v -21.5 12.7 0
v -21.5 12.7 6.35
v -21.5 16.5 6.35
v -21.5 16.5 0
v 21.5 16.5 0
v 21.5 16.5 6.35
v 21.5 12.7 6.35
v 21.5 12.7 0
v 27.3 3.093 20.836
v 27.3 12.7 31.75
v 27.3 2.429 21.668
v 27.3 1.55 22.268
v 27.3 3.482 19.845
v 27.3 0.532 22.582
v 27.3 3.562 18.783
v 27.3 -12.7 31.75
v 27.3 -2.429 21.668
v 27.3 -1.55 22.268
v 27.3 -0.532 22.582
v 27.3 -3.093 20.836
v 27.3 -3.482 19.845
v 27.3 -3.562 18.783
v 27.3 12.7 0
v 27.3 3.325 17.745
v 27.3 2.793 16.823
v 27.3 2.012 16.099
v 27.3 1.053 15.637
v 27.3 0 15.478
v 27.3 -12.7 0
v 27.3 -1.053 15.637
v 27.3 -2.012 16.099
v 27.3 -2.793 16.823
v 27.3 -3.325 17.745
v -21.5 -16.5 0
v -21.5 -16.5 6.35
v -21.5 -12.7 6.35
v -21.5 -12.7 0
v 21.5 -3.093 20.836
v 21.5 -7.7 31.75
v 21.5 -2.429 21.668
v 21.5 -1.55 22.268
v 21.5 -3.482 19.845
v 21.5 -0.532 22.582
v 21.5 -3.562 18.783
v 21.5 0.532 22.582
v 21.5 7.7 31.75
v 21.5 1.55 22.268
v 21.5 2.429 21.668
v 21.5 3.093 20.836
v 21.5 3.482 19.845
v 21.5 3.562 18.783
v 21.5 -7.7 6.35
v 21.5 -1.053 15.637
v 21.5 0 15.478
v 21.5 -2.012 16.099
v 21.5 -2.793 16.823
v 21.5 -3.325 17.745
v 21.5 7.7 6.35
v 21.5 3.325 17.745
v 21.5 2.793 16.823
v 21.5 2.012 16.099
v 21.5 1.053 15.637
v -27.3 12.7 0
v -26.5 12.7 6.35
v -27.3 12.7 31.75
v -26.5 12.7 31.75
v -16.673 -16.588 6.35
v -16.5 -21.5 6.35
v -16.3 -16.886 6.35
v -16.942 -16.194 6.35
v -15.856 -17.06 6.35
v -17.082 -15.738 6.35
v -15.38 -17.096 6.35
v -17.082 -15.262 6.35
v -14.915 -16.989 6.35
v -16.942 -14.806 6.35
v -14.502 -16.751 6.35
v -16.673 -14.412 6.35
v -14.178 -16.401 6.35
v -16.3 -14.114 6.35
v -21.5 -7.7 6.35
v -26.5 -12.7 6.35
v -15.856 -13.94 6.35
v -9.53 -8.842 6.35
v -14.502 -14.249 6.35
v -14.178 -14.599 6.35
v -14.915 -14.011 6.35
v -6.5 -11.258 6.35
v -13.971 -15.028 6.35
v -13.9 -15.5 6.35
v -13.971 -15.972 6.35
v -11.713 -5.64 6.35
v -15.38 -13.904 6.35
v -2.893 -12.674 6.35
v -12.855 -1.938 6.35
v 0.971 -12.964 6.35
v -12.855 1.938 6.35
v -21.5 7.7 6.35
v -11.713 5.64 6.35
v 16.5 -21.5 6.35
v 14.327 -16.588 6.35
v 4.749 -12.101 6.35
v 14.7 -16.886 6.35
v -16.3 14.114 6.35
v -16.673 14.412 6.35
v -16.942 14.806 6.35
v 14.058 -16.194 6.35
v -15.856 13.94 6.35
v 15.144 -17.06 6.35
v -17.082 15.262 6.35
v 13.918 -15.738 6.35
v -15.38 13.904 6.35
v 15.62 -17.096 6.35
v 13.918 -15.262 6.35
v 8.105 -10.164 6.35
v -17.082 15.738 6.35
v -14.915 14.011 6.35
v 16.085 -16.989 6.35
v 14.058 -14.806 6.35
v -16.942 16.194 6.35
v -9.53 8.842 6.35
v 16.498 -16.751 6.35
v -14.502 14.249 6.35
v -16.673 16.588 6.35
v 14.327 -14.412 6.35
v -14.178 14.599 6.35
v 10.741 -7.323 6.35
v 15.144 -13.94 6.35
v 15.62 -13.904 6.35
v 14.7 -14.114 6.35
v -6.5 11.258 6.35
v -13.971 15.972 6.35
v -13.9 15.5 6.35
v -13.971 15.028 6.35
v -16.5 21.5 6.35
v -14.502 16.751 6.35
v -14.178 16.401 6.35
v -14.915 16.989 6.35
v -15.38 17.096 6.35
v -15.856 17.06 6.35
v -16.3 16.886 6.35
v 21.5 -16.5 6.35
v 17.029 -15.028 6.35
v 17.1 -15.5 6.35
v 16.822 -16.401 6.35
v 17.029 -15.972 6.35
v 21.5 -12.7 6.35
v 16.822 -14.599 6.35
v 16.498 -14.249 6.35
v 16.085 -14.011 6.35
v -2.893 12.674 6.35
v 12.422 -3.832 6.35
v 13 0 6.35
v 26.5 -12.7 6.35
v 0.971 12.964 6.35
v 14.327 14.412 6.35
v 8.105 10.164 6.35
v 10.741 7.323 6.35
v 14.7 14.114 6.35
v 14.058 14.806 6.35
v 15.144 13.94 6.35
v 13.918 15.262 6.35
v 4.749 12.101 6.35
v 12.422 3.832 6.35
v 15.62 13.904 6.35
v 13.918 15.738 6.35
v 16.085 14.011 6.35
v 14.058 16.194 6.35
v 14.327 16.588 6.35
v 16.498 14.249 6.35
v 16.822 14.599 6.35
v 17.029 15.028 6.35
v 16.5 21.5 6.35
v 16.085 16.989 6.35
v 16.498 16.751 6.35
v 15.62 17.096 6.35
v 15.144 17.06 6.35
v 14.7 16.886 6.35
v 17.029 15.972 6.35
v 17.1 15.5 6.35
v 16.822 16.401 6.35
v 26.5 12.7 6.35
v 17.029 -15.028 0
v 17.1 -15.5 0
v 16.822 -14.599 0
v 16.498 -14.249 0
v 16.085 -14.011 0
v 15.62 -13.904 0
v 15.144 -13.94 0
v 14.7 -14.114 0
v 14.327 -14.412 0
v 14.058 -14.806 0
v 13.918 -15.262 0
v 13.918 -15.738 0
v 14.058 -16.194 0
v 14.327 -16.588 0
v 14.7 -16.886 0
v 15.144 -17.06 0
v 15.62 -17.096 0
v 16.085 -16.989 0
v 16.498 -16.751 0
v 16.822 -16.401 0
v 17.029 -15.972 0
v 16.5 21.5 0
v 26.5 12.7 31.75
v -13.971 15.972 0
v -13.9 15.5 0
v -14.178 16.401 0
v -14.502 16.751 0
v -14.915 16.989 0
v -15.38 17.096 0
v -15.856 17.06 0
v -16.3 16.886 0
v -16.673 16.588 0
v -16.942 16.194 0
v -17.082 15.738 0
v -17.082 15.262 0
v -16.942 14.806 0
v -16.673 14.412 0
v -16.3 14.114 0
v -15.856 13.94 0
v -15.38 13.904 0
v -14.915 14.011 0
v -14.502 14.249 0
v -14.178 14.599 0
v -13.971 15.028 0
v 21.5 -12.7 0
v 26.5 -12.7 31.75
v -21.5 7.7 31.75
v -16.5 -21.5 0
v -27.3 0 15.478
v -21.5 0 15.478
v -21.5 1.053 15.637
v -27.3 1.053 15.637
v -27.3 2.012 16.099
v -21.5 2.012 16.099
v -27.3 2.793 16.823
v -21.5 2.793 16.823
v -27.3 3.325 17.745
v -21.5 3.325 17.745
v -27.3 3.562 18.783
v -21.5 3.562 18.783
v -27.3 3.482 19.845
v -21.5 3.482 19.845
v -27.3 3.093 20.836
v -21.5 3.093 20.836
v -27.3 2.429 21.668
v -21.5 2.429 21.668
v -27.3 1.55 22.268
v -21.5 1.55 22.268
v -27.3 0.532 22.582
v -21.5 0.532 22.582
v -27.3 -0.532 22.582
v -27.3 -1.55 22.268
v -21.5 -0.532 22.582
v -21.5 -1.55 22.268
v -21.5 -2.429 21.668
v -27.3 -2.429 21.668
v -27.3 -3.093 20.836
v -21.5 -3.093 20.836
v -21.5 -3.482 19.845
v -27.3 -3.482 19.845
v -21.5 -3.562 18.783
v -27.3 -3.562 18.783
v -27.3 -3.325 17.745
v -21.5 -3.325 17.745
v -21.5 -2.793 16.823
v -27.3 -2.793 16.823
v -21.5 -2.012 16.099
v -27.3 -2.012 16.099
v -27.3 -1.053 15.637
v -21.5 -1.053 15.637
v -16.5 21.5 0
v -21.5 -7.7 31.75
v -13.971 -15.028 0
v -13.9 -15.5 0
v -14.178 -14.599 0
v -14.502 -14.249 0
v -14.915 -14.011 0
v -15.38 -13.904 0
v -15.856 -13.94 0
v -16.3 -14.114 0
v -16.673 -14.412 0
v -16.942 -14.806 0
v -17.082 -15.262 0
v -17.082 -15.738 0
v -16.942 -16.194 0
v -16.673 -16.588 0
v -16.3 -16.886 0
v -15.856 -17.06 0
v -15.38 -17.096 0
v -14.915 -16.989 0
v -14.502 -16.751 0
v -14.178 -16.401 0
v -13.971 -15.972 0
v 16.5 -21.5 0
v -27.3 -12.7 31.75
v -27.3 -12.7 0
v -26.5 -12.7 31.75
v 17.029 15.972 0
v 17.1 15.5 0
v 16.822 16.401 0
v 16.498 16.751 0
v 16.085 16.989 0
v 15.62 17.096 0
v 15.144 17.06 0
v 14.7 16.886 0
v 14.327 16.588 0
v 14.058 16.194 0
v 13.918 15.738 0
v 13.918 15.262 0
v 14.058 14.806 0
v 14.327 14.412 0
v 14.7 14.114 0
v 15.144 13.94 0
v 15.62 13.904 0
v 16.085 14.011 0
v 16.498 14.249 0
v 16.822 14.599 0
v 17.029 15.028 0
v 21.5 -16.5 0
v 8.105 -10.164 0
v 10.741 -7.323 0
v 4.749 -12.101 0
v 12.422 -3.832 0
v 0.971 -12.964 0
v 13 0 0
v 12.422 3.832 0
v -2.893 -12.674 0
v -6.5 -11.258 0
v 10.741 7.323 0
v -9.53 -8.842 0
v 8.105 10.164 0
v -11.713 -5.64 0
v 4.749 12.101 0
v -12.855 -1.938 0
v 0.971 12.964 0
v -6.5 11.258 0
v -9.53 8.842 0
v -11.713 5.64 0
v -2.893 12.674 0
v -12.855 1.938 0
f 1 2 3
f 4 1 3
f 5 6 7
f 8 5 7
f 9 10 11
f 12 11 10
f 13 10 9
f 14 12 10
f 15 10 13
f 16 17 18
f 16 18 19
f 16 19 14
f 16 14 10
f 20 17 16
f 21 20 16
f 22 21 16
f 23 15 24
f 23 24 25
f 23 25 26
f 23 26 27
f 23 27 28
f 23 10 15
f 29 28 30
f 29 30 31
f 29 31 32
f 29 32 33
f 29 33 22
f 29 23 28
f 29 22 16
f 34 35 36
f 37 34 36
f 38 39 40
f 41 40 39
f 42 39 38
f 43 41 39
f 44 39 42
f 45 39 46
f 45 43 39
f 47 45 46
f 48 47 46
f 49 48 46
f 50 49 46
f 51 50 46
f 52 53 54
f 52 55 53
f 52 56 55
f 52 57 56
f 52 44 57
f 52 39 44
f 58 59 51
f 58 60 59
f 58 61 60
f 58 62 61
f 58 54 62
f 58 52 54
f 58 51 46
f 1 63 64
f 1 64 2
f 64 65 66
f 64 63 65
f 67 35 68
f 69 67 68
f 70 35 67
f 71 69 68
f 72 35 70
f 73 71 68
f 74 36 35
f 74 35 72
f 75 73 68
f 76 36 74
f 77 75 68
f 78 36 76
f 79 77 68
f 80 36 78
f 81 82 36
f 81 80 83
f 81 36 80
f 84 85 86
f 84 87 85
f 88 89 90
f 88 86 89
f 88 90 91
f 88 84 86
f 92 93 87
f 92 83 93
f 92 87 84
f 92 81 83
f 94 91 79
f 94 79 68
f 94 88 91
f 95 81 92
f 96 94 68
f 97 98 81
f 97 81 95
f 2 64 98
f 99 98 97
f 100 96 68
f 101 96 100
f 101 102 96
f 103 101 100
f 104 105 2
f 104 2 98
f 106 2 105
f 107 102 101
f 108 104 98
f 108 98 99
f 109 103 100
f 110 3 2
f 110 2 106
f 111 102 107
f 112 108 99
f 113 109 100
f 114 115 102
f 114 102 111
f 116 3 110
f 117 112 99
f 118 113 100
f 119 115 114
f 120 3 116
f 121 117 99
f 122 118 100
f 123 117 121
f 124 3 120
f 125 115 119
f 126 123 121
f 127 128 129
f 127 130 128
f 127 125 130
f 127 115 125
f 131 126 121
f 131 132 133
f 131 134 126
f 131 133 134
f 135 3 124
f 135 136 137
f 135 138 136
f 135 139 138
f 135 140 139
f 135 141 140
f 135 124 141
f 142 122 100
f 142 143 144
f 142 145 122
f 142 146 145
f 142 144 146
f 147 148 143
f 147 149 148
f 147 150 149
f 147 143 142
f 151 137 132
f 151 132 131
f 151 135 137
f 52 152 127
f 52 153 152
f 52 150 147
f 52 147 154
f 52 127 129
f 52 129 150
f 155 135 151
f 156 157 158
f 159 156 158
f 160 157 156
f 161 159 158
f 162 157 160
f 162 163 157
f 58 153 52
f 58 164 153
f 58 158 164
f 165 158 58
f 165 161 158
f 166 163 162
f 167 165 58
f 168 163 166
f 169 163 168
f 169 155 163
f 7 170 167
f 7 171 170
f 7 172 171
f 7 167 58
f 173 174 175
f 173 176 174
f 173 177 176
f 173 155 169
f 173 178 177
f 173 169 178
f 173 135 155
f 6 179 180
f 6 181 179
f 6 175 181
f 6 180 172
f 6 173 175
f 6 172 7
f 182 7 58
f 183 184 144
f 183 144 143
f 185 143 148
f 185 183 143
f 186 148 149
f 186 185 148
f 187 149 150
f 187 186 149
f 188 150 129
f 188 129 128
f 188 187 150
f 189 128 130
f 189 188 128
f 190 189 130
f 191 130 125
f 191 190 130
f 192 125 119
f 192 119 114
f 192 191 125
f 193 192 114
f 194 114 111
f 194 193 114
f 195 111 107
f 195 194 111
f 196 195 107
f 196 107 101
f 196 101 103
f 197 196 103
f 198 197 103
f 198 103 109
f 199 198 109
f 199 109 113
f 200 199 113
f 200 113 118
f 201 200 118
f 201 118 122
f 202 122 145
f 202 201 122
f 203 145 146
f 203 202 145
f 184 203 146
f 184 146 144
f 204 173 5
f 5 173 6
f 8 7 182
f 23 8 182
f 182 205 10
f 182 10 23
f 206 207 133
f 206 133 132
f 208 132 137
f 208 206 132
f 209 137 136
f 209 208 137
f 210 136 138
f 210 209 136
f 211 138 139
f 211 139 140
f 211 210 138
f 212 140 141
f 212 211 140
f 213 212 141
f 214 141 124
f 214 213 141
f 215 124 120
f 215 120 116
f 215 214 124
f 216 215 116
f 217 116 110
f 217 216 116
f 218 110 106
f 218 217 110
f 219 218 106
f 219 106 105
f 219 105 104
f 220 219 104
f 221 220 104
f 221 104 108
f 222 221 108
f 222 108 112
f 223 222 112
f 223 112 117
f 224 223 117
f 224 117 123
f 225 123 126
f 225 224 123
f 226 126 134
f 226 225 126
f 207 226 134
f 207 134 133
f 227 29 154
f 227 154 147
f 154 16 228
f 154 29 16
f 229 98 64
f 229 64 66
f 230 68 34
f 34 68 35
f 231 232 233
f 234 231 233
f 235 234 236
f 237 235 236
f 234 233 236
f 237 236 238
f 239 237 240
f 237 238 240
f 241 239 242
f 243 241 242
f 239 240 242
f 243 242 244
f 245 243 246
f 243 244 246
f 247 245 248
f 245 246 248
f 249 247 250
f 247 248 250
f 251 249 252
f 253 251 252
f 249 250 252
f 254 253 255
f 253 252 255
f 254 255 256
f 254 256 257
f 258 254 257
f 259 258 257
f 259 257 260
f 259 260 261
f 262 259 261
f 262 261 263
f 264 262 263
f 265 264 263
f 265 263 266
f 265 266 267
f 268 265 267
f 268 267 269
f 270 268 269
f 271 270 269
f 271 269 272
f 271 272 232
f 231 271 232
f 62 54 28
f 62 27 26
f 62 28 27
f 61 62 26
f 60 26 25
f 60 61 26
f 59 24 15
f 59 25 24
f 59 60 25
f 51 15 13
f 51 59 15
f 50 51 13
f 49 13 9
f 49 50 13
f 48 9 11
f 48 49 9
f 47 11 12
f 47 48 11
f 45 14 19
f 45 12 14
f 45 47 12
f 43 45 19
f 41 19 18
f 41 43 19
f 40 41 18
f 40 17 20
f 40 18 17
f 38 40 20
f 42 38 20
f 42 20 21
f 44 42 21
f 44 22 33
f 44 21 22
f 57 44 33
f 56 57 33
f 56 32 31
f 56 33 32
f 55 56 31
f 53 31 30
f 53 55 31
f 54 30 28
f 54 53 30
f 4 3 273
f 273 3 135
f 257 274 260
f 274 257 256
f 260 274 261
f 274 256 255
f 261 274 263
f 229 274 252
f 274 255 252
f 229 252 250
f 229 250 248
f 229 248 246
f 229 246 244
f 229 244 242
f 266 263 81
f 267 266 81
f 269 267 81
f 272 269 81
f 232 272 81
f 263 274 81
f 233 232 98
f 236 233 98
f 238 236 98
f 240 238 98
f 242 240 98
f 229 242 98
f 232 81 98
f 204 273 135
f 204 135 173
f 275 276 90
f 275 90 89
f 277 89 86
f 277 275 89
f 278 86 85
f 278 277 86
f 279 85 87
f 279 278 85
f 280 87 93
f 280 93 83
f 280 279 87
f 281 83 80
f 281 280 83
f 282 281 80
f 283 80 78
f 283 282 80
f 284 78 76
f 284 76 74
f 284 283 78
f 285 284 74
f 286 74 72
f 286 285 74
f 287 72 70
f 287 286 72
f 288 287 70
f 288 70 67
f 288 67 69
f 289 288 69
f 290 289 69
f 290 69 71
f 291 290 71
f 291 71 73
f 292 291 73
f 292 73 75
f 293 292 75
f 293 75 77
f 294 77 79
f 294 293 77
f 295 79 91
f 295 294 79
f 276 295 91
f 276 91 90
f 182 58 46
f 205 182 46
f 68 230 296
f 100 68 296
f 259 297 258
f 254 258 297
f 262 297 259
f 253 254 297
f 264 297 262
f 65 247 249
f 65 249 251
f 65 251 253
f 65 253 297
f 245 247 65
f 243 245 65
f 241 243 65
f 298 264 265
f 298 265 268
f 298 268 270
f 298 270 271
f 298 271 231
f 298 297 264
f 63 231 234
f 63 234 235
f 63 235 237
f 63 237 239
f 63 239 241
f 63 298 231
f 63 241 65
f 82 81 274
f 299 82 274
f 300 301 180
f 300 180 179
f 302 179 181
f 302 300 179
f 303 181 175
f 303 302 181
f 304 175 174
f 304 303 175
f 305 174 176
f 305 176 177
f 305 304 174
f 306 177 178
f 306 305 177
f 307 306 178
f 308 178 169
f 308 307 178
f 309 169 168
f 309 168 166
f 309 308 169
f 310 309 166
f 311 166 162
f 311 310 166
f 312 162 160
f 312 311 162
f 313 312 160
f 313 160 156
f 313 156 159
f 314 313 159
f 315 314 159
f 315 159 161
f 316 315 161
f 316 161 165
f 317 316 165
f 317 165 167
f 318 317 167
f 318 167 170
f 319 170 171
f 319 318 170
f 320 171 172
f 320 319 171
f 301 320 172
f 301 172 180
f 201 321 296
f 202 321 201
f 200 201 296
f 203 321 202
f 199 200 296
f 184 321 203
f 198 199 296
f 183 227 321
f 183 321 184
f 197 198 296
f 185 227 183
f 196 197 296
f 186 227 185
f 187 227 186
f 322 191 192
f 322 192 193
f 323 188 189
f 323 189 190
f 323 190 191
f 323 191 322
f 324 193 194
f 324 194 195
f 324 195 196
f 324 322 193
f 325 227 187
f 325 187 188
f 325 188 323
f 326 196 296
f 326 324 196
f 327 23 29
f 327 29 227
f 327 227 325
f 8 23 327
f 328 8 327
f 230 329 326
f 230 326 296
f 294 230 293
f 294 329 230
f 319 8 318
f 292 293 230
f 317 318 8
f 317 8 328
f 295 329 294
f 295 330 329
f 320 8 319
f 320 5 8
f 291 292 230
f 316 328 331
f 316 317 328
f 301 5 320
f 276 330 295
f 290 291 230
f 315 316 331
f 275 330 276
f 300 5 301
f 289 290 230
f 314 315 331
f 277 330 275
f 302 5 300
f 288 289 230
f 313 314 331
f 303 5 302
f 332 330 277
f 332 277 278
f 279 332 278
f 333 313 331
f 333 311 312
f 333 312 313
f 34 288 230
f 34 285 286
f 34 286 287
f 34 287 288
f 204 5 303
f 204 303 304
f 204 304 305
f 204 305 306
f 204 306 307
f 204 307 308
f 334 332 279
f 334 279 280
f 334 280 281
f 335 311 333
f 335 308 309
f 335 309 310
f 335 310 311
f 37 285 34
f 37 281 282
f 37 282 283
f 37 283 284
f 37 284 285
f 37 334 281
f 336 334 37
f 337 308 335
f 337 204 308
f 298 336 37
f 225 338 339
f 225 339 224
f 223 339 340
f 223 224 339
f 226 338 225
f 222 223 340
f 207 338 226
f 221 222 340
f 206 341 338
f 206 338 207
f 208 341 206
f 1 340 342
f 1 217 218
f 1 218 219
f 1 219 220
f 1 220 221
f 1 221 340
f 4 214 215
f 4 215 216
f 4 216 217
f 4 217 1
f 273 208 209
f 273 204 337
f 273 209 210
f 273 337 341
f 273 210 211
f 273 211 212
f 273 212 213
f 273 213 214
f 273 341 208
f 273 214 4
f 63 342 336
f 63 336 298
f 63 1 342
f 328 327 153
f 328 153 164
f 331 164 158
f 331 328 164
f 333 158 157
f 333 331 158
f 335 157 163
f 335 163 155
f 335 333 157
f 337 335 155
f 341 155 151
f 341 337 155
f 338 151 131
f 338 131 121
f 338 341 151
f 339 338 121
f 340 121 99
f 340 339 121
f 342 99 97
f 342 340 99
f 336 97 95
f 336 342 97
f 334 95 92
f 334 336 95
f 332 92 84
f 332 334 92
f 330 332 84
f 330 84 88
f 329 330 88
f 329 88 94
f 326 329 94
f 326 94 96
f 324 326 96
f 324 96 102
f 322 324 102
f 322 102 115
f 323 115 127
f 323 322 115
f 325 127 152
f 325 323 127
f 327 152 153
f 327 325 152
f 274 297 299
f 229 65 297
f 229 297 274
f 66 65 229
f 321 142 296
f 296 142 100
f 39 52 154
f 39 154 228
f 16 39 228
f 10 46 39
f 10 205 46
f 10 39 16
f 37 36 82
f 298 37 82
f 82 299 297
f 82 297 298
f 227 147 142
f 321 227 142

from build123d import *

# Parameters (mm, degrees)
SKETCH1_R               = 13
SKETCH1_R_2             = 1.6
BOSS_EXTRUDE1_DEPTH     = 6.35
SKETCH2_W               = 5.8
SKETCH2_H               = 43
BOSS_EXTRUDE2_DEPTH     = 25.4
CUT_EXTRUDE1_DEPTH      = 26.4
CUT_EXTRUDE1_DEPTH_BACK = 7.35
SKETCH5_R               = 3.571875
CUT_EXTRUDE2_DEPTH      = 49.8
CUT_EXTRUDE2_DEPTH_BACK = 6.8
CHAMFER1_SIZE           = 5


with BuildPart() as part:
    # Sketch1 → Boss-Extrude1 (new body)
    with BuildSketch(Plane.XY):
        Polygon((-21.5, 21.5), (21.5, 21.5), (27.3, 21.5), (27.3, -21.5), (21.5, -21.5), (-21.5, -21.5), (-27.3, -21.5), (-27.3, 21.5), align=None)
        Circle(SKETCH1_R, mode=Mode.SUBTRACT)
        with Locations((-15.5, 15.5)):
            Circle(SKETCH1_R_2, mode=Mode.SUBTRACT)
        with Locations((15.5, 15.5)):
            Circle(SKETCH1_R_2, mode=Mode.SUBTRACT)
        with Locations((15.5, -15.5)):
            Circle(SKETCH1_R_2, mode=Mode.SUBTRACT)
        with Locations((-15.5, -15.5)):
            Circle(SKETCH1_R_2, mode=Mode.SUBTRACT)
    extrude(amount=BOSS_EXTRUDE1_DEPTH)

    # Sketch2 → Boss-Extrude2 (add)
    with BuildSketch(Plane.XY.offset(6.35)):
        with Locations((-24.4, 0)):
            Rectangle(SKETCH2_W, SKETCH2_H)
        with Locations((24.4, 0)):
            Rectangle(SKETCH2_W, SKETCH2_H)
    extrude(amount=BOSS_EXTRUDE2_DEPTH)

    # Sketch4 → Cut-Extrude1 (cut, two sides)
    with BuildSketch(Plane.XY.offset(6.35)) as cut_extrude1_sk:
        Polygon((-27.3, 12.7), (-21.5, 12.7), (-21.5, 16.5), (-16.5, 21.5), (-21.5, 21.5), (-27.3, 21.5), align=None)
        Polygon((21.5, 21.5), (16.5, 21.5), (21.5, 16.5), (21.5, 12.7), (27.3, 12.7), (27.3, 21.5), align=None)
        Polygon((27.3, -21.5), (27.3, -12.7), (21.5, -12.7), (21.5, -16.5), (16.5, -21.5), (21.5, -21.5), align=None)
        Polygon((-27.3, -21.5), (-21.5, -21.5), (-16.5, -21.5), (-21.5, -16.5), (-21.5, -12.7), (-27.3, -12.7), align=None)
    extrude(amount=CUT_EXTRUDE1_DEPTH, mode=Mode.SUBTRACT)
    extrude(cut_extrude1_sk.sketch, amount=-CUT_EXTRUDE1_DEPTH_BACK, mode=Mode.SUBTRACT)

    # Sketch5 → Cut-Extrude2 (cut, two sides)
    with BuildSketch(Plane(origin=(-21.5, 0, 0), x_dir=(0, 0, -1), z_dir=(1, 0, 0))) as cut_extrude2_sk:
        with Locations((-19.05, 0)):
            Circle(SKETCH5_R)
    extrude(amount=CUT_EXTRUDE2_DEPTH, mode=Mode.SUBTRACT)
    extrude(cut_extrude2_sk.sketch, amount=-CUT_EXTRUDE2_DEPTH_BACK, mode=Mode.SUBTRACT)

    # Chamfer1
    chamfer1_edges = [part.edges().sort_by_distance(p)[0] for p in [
        (21.5, -12.7, 19.05),
        (-21.5, 12.7, 19.05),
        (-21.5, -12.7, 19.05),
        (21.5, 12.7, 19.05),
    ]]
    chamfer(chamfer1_edges, length=CHAMFER1_SIZE)


solid = part.part
